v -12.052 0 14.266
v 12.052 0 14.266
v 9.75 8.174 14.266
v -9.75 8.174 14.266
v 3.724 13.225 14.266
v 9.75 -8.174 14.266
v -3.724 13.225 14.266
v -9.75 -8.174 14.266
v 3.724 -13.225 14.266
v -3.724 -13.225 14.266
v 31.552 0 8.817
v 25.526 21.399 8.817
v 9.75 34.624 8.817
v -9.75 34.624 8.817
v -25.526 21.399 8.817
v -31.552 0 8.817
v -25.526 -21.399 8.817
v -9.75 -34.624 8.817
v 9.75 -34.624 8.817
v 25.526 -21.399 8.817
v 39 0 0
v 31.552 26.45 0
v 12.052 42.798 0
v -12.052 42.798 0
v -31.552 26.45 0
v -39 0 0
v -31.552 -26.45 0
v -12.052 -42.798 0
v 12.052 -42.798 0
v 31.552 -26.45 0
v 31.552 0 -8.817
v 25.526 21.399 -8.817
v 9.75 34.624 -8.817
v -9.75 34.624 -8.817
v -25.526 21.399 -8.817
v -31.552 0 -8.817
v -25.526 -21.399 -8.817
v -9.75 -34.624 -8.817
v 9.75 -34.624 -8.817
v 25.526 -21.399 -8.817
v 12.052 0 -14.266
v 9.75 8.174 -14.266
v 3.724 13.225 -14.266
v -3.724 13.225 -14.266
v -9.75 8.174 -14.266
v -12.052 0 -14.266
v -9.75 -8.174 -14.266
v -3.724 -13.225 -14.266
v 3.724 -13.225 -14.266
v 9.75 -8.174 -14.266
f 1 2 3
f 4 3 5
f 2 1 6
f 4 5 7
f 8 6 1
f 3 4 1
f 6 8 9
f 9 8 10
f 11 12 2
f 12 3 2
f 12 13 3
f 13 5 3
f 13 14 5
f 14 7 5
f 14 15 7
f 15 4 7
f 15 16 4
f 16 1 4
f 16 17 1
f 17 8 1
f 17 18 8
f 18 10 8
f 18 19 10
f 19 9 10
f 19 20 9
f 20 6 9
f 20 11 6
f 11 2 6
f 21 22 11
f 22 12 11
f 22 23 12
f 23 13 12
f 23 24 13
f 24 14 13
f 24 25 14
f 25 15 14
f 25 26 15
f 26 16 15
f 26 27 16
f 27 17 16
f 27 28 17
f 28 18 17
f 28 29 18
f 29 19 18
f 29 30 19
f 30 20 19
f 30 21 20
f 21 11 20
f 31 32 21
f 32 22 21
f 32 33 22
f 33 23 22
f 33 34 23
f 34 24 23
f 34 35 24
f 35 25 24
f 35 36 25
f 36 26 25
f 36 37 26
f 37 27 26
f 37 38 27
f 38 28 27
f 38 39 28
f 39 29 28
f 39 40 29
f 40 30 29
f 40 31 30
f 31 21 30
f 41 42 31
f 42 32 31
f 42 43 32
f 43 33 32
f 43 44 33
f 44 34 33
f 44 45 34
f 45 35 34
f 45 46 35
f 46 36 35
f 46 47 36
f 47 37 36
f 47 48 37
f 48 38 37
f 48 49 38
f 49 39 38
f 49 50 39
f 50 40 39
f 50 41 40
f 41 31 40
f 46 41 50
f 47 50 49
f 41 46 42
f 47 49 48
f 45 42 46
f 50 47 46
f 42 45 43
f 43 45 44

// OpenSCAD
// Generated by SolidPython 1.0.1 on 2020-07-29 00:46:51


scale(v = [13, 15, 5]) {
	sphere(r = 3);
}
/***********************************************
*********      SolidPython code:      **********
************************************************
 
# import packages: SolidPython
from solid import *
from solid.utils import *
from itertools import chain, combinations, permutations


class Resize:

    def __init__(self, scad_file):
        self.scad_file = scad_file
        #self.scad_file = import_scad(scad_file)
        # cone/cylinder param:
        self.r1 = 0
        self.r2 = 0
        self.h = 0
        # rectangular prism param:
        self.w = 0
        self.l = 0
        # ellipse param:
        self.r = 0

    # import OpenScad code (file name corresponds to shape)


    # classify shape + parameters
    def assign(self, param1, param2, param3):
        if self.scad_file == 'cone.scad':
            self.r1 = param1
            self.r2 = param2
            self.h = param3
        elif self.scad_file == 'cylinder.scad':
            self.r1 = param1
            self.r2 = param2
            self.h = param3
        elif self.scad_file == 'rectangularPrism.scad':
            self.h = param1
            self.l = param2
            self.w = param3
        else:
            self.r = param1
            self.h = param2

    # resize parameters
    def iterate(self):
        x = range(3, 20, 2)
        i = 1
        if self.scad_file == 'cone.scad':
            tempList = list(permutations(x, 2))
            for temp in tempList:
                param1 = temp[0]
                param2 = temp[1]
                filepath = 'produced_scad_files/' + 'cone' + str(param1) + '_' + str(param2) + '_' + '.scad'
                scad_render_to_file(cylinder(h=param1, r1=param2, r2=0), filepath)

        elif self.scad_file == 'cylinder.scad':
            tempList = list(permutations(x, 3))
            for temp in tempList:
                param1 = temp[0]
                param2 = temp[1]
                filepath = 'produced_scad_files/' + 'cylinder' + str(param1) + '_' + str(param2) + '_' + '.scad'
                scad_render_to_file(cylinder(h=param1, r1=param2, r2=param2), filepath)

        elif self.scad_file == 'rectangularPrism.scad':
            tempList = list(permutations(x, 3))
            for temp in tempList:
                param1 = temp[0]
                param2 = temp[1]
                param3 = temp[2]
                filepath = 'produced_scad_files/' + 'rectangularPrism' + str(param1) + '_' + str(param2) + '_' + str(
                    param3) + '.scad'
                scad_render_to_file(cube(size=(param1, param2, param3)), filepath)

        elif self.scad_file == 'ellipse.scad':
            tempList = list(permutations(x, 4))
            for temp in tempList:
                param1 = temp[0]
                param2 = temp[1]
                param3 = temp[2]
                param4 = temp[3]
                filepath = 'produced_scad_files/' + 'ellipse' + str(param1) + '_' + str(param2) + '_' + str(param3) + '_' + str(param4) + '.scad'
                scad_render_to_file(scale([param1, param2, param3])(sphere(r=param4)), filepath)

    def render_to_scadfile(self):
        scad_render_to_file(scad, 'example.scad') 
 
************************************************/
